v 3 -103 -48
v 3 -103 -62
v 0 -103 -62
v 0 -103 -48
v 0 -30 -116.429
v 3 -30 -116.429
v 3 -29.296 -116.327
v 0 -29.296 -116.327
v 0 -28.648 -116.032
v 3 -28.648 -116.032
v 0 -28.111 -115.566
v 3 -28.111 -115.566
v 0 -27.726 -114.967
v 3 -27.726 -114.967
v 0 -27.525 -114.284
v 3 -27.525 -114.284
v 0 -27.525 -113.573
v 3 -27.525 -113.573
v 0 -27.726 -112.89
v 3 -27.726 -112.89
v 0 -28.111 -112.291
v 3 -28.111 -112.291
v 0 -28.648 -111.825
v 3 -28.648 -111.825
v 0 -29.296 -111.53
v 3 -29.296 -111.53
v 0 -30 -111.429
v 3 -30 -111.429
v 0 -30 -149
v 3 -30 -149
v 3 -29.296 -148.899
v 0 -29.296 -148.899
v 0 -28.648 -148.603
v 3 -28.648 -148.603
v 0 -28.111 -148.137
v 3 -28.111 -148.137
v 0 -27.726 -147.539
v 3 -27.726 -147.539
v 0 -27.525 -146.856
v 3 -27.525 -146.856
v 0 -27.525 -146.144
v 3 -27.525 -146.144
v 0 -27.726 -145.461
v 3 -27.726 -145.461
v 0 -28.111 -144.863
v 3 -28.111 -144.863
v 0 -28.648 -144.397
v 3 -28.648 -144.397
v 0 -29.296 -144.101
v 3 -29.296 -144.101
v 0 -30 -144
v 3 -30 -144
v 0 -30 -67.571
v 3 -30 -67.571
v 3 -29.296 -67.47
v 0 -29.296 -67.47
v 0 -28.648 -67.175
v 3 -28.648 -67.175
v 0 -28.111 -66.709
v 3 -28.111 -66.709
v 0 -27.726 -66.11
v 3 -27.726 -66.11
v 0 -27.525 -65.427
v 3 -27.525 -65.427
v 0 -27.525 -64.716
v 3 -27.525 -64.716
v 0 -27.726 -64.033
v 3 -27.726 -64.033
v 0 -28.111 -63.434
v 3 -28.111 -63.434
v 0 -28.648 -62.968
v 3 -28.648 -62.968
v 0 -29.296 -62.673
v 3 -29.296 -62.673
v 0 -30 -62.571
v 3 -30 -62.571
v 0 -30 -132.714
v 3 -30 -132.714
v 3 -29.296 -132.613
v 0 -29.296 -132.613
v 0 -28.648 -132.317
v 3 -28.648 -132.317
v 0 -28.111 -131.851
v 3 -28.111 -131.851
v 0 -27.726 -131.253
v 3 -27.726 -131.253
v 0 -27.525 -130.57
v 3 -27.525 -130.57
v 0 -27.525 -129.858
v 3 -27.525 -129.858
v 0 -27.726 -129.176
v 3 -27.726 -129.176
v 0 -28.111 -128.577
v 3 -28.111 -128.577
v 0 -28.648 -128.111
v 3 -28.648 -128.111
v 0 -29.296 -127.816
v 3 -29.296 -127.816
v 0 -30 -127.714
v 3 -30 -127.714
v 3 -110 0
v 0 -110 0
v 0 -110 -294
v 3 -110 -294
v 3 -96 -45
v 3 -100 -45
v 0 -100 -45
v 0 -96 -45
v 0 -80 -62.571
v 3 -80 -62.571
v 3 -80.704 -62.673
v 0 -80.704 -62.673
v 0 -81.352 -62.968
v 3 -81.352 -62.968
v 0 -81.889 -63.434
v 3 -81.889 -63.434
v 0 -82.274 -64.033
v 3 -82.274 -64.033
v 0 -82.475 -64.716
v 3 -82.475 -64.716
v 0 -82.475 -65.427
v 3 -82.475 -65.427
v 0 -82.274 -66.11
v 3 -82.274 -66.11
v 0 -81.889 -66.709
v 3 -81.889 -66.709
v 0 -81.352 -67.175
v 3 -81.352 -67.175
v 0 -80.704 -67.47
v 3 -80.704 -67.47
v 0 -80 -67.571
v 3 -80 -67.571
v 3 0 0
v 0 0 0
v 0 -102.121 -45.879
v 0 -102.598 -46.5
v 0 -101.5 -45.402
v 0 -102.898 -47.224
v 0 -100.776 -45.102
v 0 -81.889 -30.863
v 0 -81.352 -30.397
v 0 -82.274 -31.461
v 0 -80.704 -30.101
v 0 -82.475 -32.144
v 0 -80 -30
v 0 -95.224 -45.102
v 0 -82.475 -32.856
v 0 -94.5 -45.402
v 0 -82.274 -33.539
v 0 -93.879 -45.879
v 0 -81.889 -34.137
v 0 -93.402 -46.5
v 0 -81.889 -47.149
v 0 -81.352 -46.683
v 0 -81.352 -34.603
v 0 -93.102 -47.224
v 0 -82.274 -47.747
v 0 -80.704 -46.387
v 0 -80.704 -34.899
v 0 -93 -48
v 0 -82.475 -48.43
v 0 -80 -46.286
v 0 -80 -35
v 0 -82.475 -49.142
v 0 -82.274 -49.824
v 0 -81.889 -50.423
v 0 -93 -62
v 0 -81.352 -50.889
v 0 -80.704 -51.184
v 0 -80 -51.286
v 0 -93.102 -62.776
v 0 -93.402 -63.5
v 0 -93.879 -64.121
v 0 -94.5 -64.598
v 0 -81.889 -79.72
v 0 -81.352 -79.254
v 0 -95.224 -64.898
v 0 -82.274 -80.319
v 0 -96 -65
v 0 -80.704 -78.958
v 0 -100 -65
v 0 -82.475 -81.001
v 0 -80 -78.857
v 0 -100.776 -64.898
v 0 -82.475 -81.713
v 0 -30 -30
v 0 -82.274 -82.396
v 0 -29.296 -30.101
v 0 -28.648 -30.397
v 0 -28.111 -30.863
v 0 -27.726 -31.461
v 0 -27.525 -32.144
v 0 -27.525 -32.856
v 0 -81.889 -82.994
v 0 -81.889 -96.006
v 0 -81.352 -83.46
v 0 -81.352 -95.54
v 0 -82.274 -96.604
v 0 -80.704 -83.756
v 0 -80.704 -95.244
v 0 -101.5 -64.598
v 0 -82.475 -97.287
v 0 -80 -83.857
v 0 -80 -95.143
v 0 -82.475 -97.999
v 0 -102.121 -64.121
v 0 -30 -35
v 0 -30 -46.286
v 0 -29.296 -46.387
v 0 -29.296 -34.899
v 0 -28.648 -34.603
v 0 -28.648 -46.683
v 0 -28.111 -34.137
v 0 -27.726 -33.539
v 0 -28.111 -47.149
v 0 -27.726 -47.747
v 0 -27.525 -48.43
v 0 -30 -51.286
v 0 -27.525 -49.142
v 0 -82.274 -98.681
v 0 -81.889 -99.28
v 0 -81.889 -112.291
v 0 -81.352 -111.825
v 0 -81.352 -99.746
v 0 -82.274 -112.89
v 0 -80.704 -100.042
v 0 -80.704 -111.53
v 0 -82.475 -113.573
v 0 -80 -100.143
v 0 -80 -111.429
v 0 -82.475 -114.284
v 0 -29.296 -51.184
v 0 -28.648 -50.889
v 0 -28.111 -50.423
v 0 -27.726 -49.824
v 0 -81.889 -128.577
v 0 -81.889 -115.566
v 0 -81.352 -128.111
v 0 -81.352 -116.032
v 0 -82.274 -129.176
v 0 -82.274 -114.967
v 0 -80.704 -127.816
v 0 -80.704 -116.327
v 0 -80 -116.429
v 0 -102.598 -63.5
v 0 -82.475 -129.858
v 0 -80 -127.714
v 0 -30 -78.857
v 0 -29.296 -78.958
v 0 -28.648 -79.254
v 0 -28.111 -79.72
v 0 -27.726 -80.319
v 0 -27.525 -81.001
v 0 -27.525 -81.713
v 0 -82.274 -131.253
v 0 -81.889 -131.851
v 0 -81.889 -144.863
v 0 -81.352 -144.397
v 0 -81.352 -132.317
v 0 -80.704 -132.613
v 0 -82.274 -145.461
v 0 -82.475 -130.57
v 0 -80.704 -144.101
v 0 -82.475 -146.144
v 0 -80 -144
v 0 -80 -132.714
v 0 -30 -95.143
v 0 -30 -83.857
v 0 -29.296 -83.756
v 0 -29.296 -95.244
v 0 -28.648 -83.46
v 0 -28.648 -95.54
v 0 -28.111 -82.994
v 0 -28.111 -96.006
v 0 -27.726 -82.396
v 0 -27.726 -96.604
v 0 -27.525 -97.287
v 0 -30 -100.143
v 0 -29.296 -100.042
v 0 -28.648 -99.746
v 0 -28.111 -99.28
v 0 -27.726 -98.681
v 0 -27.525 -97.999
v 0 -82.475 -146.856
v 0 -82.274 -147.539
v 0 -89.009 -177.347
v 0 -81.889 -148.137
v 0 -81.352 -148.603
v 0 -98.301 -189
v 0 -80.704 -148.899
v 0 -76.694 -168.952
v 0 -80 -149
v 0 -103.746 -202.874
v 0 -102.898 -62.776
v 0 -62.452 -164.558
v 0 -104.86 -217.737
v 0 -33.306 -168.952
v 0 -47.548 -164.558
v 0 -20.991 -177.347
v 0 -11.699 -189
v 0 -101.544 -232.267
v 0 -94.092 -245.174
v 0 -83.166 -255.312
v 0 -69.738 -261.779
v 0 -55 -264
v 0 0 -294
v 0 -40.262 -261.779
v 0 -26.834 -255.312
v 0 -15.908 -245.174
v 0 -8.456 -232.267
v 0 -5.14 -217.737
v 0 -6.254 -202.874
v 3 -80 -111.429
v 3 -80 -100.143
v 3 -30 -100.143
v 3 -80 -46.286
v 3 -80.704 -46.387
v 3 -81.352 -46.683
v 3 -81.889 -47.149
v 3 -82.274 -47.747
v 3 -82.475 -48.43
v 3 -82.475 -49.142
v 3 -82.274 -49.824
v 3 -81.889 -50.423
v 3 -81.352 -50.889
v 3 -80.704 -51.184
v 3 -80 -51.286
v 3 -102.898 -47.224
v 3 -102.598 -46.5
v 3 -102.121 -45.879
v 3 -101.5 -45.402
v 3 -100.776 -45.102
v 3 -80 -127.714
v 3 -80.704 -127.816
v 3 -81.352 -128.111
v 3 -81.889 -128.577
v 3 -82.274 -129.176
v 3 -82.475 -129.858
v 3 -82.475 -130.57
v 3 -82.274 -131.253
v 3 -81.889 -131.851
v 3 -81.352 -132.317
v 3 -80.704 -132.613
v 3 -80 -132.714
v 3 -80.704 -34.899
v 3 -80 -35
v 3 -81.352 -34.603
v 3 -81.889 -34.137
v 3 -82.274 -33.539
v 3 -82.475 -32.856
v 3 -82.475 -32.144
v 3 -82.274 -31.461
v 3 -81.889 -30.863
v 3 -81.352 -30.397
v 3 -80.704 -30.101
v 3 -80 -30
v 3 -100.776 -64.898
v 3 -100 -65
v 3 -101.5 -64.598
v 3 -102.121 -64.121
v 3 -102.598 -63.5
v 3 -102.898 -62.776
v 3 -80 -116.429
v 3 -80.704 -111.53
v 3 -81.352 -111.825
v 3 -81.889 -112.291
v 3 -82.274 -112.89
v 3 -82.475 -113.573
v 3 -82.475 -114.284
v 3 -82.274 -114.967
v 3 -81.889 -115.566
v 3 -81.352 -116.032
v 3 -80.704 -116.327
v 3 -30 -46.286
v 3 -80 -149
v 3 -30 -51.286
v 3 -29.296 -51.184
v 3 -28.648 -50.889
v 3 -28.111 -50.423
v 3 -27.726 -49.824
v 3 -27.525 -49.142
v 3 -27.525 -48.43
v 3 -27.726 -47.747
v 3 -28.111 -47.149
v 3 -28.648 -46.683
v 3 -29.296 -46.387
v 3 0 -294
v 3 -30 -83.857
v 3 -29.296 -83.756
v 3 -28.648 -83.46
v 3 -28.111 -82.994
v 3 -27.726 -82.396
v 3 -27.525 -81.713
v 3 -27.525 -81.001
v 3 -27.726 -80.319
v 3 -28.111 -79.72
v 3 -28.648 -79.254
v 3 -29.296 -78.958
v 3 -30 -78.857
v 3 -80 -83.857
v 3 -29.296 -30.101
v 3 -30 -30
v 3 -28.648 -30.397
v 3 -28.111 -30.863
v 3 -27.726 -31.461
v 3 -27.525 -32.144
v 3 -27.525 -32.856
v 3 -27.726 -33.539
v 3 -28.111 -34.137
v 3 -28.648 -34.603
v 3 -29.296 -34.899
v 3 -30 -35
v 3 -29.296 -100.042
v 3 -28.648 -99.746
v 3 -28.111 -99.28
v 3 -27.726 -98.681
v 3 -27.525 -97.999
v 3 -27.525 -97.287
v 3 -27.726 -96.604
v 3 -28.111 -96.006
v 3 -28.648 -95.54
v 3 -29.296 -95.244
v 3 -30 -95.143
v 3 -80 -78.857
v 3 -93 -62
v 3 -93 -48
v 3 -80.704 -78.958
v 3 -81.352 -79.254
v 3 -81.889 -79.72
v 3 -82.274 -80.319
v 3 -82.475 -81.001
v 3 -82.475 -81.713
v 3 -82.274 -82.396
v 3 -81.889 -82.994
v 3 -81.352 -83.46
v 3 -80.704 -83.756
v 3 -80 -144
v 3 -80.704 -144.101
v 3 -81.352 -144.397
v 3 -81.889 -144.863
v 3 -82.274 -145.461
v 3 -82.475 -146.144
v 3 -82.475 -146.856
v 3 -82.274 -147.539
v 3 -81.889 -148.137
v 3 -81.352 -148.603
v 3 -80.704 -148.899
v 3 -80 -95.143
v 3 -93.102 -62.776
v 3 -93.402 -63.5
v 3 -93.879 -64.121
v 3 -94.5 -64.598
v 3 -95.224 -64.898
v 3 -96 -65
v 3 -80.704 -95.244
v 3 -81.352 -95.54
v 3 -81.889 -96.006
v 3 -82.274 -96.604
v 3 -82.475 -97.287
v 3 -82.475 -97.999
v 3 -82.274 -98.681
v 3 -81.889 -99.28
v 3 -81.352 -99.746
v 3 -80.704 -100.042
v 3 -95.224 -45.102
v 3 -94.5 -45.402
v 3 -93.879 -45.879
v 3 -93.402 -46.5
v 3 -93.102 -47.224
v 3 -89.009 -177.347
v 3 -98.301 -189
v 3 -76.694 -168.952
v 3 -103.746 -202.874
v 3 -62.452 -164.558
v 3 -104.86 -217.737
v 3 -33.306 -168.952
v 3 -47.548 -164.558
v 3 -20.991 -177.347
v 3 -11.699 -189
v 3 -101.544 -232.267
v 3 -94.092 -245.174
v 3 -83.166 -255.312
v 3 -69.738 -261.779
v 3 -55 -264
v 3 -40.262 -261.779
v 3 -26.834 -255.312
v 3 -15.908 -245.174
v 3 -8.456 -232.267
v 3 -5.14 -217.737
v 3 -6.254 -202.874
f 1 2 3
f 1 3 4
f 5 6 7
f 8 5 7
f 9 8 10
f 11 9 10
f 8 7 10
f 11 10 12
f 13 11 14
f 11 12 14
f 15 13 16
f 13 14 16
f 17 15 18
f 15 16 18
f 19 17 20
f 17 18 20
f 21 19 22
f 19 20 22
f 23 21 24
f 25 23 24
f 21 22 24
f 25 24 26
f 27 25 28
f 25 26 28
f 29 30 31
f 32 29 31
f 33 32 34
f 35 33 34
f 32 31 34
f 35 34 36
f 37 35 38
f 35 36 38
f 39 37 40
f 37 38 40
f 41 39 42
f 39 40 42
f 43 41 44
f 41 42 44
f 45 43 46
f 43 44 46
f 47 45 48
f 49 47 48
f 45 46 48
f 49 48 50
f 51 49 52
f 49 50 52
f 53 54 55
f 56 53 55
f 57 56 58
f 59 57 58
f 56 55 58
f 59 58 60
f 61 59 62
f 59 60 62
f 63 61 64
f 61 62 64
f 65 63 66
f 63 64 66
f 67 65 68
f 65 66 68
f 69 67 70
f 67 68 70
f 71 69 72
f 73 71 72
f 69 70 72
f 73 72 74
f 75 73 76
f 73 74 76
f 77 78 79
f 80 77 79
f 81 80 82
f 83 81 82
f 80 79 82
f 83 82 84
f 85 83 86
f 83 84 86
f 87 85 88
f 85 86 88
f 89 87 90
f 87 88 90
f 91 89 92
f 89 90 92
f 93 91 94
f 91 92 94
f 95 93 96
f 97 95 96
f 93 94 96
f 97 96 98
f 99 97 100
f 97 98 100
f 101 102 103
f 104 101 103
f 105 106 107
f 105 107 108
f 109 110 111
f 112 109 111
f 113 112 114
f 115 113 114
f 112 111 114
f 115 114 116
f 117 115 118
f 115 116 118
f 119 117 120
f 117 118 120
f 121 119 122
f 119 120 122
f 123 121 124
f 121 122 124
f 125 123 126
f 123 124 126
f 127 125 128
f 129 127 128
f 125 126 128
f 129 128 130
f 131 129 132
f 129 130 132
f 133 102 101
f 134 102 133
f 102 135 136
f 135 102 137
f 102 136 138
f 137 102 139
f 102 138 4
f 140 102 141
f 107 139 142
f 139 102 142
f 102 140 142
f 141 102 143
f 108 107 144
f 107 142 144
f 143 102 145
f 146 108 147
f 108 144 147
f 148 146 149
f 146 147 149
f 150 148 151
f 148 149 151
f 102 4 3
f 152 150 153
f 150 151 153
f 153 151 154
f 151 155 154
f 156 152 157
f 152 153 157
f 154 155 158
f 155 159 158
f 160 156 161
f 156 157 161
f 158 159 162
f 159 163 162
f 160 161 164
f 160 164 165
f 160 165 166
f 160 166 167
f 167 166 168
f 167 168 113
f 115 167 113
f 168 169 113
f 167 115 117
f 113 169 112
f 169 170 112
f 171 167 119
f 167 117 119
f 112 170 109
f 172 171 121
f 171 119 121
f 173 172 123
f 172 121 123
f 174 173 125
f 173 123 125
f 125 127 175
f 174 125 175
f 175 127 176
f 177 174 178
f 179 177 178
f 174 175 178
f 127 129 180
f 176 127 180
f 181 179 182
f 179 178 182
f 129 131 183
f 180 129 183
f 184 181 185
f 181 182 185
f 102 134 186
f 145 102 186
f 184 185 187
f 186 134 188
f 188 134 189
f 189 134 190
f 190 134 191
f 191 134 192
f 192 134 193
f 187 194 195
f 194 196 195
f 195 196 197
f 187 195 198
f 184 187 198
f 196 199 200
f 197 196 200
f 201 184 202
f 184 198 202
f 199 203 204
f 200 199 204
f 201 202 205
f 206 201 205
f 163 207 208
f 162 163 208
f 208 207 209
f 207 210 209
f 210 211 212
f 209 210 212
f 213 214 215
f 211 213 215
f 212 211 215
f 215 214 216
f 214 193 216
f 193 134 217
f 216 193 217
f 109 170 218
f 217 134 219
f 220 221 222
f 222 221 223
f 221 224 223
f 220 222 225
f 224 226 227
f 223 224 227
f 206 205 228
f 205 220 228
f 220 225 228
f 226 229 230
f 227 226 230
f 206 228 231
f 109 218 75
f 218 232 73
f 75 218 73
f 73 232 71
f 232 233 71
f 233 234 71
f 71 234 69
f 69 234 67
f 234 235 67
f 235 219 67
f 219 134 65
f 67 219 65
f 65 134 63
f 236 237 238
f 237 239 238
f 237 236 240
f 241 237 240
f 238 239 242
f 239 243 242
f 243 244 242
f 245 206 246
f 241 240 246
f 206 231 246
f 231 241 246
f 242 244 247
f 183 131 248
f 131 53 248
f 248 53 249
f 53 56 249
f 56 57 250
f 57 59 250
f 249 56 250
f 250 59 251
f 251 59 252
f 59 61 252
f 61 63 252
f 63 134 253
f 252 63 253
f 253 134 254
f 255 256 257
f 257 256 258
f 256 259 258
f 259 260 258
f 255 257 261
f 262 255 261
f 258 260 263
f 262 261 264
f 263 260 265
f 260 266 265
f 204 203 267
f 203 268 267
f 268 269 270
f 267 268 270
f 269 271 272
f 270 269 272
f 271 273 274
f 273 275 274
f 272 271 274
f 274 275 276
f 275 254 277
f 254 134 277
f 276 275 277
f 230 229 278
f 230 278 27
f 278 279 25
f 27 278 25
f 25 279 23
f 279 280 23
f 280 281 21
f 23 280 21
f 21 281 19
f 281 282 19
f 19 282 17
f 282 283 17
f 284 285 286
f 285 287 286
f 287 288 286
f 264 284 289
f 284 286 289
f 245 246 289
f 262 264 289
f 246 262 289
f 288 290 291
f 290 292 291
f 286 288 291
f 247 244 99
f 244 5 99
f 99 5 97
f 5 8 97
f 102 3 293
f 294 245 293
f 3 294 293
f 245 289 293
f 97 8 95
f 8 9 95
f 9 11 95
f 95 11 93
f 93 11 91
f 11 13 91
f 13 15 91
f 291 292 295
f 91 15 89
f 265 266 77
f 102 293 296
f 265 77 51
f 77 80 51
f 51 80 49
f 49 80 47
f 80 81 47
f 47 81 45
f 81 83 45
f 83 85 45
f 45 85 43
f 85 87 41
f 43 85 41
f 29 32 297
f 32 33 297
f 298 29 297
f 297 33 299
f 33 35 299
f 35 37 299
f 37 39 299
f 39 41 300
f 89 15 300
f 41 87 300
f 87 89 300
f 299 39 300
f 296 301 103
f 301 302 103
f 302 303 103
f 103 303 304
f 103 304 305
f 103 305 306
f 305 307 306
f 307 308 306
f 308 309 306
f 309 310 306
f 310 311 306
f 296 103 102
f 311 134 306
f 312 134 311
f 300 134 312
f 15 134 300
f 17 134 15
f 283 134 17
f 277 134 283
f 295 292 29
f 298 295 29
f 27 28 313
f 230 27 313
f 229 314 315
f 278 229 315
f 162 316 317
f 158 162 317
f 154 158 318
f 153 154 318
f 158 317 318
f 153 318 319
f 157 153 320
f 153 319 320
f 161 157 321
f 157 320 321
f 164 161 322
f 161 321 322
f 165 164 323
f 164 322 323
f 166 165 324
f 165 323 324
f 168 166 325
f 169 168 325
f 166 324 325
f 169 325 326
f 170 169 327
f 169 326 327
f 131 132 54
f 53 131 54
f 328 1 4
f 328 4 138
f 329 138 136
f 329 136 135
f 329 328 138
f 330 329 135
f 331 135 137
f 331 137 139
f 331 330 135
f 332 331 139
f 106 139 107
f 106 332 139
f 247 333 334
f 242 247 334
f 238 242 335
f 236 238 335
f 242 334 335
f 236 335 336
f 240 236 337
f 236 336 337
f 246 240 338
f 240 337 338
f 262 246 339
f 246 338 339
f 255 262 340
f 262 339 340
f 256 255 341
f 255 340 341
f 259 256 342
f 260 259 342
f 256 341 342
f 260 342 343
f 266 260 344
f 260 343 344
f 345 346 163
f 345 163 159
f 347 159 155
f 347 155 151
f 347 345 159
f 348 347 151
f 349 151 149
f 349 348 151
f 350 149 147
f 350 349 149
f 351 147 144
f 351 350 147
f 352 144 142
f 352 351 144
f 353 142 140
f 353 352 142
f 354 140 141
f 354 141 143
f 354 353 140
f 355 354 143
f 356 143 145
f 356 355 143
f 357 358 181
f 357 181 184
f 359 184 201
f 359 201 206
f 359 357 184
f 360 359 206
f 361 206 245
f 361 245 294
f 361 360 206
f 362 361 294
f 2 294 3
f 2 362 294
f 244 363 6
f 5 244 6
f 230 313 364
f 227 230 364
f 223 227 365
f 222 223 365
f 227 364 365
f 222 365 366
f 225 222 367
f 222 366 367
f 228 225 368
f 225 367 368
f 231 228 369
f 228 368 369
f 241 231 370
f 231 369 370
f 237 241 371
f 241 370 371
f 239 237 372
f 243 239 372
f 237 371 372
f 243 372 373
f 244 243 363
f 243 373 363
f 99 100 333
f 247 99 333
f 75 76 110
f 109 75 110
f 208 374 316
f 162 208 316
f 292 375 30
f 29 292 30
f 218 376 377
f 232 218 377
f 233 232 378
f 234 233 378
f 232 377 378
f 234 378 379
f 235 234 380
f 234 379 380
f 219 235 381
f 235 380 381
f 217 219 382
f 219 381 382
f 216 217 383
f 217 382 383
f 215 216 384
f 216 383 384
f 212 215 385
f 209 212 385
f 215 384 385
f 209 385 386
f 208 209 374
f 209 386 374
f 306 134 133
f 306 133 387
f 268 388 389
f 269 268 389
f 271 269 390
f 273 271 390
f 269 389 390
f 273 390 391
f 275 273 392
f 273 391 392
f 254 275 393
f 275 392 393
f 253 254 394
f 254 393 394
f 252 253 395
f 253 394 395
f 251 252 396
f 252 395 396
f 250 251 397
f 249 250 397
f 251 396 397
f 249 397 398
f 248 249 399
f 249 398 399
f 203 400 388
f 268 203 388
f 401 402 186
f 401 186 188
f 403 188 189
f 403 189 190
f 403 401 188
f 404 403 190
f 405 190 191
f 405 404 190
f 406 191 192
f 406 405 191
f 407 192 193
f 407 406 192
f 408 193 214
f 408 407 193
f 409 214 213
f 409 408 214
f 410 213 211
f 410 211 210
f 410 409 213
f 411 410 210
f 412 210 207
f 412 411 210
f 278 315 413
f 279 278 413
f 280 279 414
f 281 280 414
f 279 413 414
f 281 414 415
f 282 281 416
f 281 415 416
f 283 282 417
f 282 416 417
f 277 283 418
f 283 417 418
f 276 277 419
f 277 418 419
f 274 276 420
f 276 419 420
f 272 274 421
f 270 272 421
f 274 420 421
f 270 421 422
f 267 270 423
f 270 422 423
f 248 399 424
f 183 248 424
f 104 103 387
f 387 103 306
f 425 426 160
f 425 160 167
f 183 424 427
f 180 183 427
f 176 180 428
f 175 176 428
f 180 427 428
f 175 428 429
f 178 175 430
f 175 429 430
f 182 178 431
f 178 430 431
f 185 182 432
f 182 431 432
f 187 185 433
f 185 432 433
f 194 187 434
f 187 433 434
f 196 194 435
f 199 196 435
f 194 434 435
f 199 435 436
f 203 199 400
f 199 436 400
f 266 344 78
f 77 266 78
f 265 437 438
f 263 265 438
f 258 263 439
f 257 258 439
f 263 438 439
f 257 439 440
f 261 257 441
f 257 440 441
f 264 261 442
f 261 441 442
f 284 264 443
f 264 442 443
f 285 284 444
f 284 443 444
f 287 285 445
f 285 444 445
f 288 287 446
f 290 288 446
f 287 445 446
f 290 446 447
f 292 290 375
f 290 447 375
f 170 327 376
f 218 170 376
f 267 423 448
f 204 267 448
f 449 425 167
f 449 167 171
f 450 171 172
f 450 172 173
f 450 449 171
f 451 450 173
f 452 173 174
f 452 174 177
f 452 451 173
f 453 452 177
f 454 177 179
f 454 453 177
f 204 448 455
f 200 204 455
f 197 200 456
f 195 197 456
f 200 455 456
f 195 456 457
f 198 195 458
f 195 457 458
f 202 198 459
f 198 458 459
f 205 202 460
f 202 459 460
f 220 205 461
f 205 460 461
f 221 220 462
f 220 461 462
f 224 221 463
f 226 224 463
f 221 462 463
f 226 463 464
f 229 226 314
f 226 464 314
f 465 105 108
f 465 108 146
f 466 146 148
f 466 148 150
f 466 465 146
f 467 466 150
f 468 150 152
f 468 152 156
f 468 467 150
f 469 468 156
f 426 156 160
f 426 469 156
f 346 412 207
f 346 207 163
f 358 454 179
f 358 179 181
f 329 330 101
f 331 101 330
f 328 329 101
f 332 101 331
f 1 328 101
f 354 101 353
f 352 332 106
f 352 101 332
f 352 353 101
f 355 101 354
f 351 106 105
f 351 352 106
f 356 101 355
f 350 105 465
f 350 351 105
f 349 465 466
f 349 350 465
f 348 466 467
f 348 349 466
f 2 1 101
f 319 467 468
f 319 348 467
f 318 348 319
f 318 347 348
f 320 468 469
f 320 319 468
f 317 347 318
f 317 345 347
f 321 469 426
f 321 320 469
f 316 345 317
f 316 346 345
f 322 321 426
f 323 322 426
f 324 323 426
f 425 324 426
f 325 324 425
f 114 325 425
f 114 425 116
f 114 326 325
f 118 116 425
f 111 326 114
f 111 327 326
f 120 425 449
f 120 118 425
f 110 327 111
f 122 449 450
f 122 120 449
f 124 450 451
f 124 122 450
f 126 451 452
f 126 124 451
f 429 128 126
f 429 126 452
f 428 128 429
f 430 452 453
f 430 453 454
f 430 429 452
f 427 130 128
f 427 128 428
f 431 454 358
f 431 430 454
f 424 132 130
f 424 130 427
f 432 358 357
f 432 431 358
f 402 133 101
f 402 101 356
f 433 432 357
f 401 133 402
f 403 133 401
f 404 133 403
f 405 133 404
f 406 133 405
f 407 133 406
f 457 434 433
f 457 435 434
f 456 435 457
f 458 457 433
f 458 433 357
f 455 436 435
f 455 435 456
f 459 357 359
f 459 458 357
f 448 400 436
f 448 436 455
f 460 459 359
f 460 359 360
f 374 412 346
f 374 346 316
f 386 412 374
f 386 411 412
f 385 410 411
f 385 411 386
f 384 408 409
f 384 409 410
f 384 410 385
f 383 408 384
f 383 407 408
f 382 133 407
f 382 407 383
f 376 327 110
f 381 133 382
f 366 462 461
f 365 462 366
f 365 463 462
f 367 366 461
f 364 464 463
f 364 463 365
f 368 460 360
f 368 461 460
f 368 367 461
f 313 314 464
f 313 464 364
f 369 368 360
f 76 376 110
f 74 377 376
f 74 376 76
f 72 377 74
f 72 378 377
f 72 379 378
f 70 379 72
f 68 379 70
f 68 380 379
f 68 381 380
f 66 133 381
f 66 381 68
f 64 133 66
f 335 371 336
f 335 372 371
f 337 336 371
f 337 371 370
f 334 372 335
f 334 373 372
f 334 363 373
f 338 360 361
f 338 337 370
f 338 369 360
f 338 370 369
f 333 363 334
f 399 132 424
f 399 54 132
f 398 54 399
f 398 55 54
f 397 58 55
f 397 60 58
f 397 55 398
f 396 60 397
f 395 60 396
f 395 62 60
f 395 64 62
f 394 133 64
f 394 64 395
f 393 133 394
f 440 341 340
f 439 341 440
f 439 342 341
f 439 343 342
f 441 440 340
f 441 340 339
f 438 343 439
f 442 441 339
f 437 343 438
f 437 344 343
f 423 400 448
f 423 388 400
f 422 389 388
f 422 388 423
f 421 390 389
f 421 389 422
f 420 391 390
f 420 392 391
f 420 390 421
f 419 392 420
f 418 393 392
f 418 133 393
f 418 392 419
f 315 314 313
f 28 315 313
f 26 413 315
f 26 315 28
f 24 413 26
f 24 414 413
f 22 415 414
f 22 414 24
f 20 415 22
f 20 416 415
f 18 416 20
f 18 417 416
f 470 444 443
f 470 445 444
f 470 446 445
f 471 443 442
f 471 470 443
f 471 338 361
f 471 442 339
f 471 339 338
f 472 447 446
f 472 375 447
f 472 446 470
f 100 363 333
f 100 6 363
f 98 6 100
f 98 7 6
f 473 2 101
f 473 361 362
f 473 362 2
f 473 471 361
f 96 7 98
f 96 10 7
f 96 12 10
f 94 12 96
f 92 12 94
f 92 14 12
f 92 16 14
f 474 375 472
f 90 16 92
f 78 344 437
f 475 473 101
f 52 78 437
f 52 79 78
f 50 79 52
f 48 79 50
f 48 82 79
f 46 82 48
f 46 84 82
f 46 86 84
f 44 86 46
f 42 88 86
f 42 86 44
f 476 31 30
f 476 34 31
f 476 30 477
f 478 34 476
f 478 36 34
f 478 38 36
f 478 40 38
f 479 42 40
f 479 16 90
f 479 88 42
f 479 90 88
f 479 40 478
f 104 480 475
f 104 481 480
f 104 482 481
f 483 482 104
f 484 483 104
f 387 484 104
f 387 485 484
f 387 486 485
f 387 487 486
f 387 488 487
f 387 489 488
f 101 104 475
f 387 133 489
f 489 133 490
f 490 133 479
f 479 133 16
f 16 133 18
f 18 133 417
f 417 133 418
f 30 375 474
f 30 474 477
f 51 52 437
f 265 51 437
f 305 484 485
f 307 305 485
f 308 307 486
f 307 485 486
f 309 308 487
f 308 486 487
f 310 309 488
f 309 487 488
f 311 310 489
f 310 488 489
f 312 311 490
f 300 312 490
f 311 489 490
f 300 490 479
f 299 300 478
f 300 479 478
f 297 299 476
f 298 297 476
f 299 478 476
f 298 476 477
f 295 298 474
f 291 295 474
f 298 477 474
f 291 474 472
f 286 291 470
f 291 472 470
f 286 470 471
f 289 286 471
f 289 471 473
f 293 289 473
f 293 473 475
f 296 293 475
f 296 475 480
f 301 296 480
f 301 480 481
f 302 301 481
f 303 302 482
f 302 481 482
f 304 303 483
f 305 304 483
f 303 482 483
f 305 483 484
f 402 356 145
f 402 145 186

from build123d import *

# Parameters (mm, degrees)
IZIM1_W                     = 294
IZIM1_H                     = 110
Y_KSEKLIK_EKSTR_ZYON1_DEPTH = 3
IZIM2_R                     = 50
KES_EKSTR_ZYON1_DEPTH       = 3


with BuildPart() as part:
    # Çizim1 → Yükseklik-Ekstrüzyon1 (new body)
    with BuildSketch(Plane(origin=(0, 0, 0), x_dir=(0, 0, -1), z_dir=(1, 0, 0))):
        with Locations((147, -55)):
            Rectangle(IZIM1_W, IZIM1_H)
    extrude(amount=Y_KSEKLIK_EKSTR_ZYON1_DEPTH)

    # Çizim2 → Kes-Ekstrüzyon1 (cut)
    with BuildSketch(Plane(origin=(3, 0, 0), x_dir=(0, 0, -1), z_dir=(1, 0, 0))):
        with Locations((214, -55)):
            Circle(IZIM2_R)
        with BuildLine():
            Line((35, -30), (35, -80))
            ThreePointArc((35, -80), (32.5, -82.5), (30, -80))
            Line((30, -80), (30, -30))
            ThreePointArc((30, -30), (32.5, -27.5), (35, -30))
        make_face()
        with BuildLine():
            Line((46.285714286, -30), (46.285714286, -80))
            ThreePointArc((46.285714286, -80), (48.785714286, -82.5), (51.285714286, -80))
            Line((51.285714286, -80), (51.285714286, -30))
            ThreePointArc((51.285714286, -30), (48.785714286, -27.5), (46.285714286, -30))
        make_face()
        with BuildLine():
            Line((62.571428571, -30), (62.571428571, -80))
            ThreePointArc((62.571428571, -80), (65.071428571, -82.5), (67.571428571, -80))
            Line((67.571428571, -80), (67.571428571, -30))
            ThreePointArc((67.571428571, -30), (65.071428571, -27.5), (62.571428571, -30))
        make_face()
        with BuildLine():
            Line((78.857142857, -30), (78.857142857, -80))
            ThreePointArc((78.857142857, -80), (81.357142857, -82.5), (83.857142857, -80))
            Line((83.857142857, -80), (83.857142857, -30))
            ThreePointArc((83.857142857, -30), (81.357142857, -27.5), (78.857142857, -30))
        make_face()
        with BuildLine():
            Line((95.142857143, -30), (95.142857143, -80))
            ThreePointArc((95.142857143, -80), (97.642857143, -82.5), (100.142857143, -80))
            Line((100.142857143, -80), (100.142857143, -30))
            ThreePointArc((100.142857143, -30), (97.642857143, -27.5), (95.142857143, -30))
        make_face()
        with BuildLine():
            Line((111.428571429, -30), (111.428571429, -80))
            ThreePointArc((111.428571429, -80), (113.928571429, -82.5), (116.428571429, -80))
            Line((116.428571429, -80), (116.428571429, -30))
            ThreePointArc((116.428571429, -30), (113.928571429, -27.5), (111.428571429, -30))
        make_face()
        with BuildLine():
            Line((127.714285714, -30), (127.714285714, -80))
            ThreePointArc((127.714285714, -80), (130.214285714, -82.5), (132.714285714, -80))
            Line((132.714285714, -80), (132.714285714, -30))
            ThreePointArc((132.714285714, -30), (130.214285714, -27.5), (127.714285714, -30))
        make_face()
        with BuildLine():
            Line((144, -30), (144, -80))
            ThreePointArc((144, -80), (146.5, -82.5), (149, -80))
            Line((149, -80), (149, -30))
            ThreePointArc((149, -30), (146.5, -27.5), (144, -30))
        make_face()
        with BuildLine():
            Line((48, -93), (62, -93))
            ThreePointArc((62, -93), (64.121320344, -93.878679656), (65, -96))
            Line((65, -96), (65, -100))
            ThreePointArc((65, -100), (64.121320344, -102.121320344), (62, -103))
            Line((62, -103), (48, -103))
            ThreePointArc((48, -103), (45.878679656, -102.121320344), (45, -100))
            Line((45, -100), (45, -96))
            ThreePointArc((45, -96), (45.878679656, -93.878679656), (48, -93))
        make_face()
    extrude(amount=-KES_EKSTR_ZYON1_DEPTH, mode=Mode.SUBTRACT)


solid = part.part
